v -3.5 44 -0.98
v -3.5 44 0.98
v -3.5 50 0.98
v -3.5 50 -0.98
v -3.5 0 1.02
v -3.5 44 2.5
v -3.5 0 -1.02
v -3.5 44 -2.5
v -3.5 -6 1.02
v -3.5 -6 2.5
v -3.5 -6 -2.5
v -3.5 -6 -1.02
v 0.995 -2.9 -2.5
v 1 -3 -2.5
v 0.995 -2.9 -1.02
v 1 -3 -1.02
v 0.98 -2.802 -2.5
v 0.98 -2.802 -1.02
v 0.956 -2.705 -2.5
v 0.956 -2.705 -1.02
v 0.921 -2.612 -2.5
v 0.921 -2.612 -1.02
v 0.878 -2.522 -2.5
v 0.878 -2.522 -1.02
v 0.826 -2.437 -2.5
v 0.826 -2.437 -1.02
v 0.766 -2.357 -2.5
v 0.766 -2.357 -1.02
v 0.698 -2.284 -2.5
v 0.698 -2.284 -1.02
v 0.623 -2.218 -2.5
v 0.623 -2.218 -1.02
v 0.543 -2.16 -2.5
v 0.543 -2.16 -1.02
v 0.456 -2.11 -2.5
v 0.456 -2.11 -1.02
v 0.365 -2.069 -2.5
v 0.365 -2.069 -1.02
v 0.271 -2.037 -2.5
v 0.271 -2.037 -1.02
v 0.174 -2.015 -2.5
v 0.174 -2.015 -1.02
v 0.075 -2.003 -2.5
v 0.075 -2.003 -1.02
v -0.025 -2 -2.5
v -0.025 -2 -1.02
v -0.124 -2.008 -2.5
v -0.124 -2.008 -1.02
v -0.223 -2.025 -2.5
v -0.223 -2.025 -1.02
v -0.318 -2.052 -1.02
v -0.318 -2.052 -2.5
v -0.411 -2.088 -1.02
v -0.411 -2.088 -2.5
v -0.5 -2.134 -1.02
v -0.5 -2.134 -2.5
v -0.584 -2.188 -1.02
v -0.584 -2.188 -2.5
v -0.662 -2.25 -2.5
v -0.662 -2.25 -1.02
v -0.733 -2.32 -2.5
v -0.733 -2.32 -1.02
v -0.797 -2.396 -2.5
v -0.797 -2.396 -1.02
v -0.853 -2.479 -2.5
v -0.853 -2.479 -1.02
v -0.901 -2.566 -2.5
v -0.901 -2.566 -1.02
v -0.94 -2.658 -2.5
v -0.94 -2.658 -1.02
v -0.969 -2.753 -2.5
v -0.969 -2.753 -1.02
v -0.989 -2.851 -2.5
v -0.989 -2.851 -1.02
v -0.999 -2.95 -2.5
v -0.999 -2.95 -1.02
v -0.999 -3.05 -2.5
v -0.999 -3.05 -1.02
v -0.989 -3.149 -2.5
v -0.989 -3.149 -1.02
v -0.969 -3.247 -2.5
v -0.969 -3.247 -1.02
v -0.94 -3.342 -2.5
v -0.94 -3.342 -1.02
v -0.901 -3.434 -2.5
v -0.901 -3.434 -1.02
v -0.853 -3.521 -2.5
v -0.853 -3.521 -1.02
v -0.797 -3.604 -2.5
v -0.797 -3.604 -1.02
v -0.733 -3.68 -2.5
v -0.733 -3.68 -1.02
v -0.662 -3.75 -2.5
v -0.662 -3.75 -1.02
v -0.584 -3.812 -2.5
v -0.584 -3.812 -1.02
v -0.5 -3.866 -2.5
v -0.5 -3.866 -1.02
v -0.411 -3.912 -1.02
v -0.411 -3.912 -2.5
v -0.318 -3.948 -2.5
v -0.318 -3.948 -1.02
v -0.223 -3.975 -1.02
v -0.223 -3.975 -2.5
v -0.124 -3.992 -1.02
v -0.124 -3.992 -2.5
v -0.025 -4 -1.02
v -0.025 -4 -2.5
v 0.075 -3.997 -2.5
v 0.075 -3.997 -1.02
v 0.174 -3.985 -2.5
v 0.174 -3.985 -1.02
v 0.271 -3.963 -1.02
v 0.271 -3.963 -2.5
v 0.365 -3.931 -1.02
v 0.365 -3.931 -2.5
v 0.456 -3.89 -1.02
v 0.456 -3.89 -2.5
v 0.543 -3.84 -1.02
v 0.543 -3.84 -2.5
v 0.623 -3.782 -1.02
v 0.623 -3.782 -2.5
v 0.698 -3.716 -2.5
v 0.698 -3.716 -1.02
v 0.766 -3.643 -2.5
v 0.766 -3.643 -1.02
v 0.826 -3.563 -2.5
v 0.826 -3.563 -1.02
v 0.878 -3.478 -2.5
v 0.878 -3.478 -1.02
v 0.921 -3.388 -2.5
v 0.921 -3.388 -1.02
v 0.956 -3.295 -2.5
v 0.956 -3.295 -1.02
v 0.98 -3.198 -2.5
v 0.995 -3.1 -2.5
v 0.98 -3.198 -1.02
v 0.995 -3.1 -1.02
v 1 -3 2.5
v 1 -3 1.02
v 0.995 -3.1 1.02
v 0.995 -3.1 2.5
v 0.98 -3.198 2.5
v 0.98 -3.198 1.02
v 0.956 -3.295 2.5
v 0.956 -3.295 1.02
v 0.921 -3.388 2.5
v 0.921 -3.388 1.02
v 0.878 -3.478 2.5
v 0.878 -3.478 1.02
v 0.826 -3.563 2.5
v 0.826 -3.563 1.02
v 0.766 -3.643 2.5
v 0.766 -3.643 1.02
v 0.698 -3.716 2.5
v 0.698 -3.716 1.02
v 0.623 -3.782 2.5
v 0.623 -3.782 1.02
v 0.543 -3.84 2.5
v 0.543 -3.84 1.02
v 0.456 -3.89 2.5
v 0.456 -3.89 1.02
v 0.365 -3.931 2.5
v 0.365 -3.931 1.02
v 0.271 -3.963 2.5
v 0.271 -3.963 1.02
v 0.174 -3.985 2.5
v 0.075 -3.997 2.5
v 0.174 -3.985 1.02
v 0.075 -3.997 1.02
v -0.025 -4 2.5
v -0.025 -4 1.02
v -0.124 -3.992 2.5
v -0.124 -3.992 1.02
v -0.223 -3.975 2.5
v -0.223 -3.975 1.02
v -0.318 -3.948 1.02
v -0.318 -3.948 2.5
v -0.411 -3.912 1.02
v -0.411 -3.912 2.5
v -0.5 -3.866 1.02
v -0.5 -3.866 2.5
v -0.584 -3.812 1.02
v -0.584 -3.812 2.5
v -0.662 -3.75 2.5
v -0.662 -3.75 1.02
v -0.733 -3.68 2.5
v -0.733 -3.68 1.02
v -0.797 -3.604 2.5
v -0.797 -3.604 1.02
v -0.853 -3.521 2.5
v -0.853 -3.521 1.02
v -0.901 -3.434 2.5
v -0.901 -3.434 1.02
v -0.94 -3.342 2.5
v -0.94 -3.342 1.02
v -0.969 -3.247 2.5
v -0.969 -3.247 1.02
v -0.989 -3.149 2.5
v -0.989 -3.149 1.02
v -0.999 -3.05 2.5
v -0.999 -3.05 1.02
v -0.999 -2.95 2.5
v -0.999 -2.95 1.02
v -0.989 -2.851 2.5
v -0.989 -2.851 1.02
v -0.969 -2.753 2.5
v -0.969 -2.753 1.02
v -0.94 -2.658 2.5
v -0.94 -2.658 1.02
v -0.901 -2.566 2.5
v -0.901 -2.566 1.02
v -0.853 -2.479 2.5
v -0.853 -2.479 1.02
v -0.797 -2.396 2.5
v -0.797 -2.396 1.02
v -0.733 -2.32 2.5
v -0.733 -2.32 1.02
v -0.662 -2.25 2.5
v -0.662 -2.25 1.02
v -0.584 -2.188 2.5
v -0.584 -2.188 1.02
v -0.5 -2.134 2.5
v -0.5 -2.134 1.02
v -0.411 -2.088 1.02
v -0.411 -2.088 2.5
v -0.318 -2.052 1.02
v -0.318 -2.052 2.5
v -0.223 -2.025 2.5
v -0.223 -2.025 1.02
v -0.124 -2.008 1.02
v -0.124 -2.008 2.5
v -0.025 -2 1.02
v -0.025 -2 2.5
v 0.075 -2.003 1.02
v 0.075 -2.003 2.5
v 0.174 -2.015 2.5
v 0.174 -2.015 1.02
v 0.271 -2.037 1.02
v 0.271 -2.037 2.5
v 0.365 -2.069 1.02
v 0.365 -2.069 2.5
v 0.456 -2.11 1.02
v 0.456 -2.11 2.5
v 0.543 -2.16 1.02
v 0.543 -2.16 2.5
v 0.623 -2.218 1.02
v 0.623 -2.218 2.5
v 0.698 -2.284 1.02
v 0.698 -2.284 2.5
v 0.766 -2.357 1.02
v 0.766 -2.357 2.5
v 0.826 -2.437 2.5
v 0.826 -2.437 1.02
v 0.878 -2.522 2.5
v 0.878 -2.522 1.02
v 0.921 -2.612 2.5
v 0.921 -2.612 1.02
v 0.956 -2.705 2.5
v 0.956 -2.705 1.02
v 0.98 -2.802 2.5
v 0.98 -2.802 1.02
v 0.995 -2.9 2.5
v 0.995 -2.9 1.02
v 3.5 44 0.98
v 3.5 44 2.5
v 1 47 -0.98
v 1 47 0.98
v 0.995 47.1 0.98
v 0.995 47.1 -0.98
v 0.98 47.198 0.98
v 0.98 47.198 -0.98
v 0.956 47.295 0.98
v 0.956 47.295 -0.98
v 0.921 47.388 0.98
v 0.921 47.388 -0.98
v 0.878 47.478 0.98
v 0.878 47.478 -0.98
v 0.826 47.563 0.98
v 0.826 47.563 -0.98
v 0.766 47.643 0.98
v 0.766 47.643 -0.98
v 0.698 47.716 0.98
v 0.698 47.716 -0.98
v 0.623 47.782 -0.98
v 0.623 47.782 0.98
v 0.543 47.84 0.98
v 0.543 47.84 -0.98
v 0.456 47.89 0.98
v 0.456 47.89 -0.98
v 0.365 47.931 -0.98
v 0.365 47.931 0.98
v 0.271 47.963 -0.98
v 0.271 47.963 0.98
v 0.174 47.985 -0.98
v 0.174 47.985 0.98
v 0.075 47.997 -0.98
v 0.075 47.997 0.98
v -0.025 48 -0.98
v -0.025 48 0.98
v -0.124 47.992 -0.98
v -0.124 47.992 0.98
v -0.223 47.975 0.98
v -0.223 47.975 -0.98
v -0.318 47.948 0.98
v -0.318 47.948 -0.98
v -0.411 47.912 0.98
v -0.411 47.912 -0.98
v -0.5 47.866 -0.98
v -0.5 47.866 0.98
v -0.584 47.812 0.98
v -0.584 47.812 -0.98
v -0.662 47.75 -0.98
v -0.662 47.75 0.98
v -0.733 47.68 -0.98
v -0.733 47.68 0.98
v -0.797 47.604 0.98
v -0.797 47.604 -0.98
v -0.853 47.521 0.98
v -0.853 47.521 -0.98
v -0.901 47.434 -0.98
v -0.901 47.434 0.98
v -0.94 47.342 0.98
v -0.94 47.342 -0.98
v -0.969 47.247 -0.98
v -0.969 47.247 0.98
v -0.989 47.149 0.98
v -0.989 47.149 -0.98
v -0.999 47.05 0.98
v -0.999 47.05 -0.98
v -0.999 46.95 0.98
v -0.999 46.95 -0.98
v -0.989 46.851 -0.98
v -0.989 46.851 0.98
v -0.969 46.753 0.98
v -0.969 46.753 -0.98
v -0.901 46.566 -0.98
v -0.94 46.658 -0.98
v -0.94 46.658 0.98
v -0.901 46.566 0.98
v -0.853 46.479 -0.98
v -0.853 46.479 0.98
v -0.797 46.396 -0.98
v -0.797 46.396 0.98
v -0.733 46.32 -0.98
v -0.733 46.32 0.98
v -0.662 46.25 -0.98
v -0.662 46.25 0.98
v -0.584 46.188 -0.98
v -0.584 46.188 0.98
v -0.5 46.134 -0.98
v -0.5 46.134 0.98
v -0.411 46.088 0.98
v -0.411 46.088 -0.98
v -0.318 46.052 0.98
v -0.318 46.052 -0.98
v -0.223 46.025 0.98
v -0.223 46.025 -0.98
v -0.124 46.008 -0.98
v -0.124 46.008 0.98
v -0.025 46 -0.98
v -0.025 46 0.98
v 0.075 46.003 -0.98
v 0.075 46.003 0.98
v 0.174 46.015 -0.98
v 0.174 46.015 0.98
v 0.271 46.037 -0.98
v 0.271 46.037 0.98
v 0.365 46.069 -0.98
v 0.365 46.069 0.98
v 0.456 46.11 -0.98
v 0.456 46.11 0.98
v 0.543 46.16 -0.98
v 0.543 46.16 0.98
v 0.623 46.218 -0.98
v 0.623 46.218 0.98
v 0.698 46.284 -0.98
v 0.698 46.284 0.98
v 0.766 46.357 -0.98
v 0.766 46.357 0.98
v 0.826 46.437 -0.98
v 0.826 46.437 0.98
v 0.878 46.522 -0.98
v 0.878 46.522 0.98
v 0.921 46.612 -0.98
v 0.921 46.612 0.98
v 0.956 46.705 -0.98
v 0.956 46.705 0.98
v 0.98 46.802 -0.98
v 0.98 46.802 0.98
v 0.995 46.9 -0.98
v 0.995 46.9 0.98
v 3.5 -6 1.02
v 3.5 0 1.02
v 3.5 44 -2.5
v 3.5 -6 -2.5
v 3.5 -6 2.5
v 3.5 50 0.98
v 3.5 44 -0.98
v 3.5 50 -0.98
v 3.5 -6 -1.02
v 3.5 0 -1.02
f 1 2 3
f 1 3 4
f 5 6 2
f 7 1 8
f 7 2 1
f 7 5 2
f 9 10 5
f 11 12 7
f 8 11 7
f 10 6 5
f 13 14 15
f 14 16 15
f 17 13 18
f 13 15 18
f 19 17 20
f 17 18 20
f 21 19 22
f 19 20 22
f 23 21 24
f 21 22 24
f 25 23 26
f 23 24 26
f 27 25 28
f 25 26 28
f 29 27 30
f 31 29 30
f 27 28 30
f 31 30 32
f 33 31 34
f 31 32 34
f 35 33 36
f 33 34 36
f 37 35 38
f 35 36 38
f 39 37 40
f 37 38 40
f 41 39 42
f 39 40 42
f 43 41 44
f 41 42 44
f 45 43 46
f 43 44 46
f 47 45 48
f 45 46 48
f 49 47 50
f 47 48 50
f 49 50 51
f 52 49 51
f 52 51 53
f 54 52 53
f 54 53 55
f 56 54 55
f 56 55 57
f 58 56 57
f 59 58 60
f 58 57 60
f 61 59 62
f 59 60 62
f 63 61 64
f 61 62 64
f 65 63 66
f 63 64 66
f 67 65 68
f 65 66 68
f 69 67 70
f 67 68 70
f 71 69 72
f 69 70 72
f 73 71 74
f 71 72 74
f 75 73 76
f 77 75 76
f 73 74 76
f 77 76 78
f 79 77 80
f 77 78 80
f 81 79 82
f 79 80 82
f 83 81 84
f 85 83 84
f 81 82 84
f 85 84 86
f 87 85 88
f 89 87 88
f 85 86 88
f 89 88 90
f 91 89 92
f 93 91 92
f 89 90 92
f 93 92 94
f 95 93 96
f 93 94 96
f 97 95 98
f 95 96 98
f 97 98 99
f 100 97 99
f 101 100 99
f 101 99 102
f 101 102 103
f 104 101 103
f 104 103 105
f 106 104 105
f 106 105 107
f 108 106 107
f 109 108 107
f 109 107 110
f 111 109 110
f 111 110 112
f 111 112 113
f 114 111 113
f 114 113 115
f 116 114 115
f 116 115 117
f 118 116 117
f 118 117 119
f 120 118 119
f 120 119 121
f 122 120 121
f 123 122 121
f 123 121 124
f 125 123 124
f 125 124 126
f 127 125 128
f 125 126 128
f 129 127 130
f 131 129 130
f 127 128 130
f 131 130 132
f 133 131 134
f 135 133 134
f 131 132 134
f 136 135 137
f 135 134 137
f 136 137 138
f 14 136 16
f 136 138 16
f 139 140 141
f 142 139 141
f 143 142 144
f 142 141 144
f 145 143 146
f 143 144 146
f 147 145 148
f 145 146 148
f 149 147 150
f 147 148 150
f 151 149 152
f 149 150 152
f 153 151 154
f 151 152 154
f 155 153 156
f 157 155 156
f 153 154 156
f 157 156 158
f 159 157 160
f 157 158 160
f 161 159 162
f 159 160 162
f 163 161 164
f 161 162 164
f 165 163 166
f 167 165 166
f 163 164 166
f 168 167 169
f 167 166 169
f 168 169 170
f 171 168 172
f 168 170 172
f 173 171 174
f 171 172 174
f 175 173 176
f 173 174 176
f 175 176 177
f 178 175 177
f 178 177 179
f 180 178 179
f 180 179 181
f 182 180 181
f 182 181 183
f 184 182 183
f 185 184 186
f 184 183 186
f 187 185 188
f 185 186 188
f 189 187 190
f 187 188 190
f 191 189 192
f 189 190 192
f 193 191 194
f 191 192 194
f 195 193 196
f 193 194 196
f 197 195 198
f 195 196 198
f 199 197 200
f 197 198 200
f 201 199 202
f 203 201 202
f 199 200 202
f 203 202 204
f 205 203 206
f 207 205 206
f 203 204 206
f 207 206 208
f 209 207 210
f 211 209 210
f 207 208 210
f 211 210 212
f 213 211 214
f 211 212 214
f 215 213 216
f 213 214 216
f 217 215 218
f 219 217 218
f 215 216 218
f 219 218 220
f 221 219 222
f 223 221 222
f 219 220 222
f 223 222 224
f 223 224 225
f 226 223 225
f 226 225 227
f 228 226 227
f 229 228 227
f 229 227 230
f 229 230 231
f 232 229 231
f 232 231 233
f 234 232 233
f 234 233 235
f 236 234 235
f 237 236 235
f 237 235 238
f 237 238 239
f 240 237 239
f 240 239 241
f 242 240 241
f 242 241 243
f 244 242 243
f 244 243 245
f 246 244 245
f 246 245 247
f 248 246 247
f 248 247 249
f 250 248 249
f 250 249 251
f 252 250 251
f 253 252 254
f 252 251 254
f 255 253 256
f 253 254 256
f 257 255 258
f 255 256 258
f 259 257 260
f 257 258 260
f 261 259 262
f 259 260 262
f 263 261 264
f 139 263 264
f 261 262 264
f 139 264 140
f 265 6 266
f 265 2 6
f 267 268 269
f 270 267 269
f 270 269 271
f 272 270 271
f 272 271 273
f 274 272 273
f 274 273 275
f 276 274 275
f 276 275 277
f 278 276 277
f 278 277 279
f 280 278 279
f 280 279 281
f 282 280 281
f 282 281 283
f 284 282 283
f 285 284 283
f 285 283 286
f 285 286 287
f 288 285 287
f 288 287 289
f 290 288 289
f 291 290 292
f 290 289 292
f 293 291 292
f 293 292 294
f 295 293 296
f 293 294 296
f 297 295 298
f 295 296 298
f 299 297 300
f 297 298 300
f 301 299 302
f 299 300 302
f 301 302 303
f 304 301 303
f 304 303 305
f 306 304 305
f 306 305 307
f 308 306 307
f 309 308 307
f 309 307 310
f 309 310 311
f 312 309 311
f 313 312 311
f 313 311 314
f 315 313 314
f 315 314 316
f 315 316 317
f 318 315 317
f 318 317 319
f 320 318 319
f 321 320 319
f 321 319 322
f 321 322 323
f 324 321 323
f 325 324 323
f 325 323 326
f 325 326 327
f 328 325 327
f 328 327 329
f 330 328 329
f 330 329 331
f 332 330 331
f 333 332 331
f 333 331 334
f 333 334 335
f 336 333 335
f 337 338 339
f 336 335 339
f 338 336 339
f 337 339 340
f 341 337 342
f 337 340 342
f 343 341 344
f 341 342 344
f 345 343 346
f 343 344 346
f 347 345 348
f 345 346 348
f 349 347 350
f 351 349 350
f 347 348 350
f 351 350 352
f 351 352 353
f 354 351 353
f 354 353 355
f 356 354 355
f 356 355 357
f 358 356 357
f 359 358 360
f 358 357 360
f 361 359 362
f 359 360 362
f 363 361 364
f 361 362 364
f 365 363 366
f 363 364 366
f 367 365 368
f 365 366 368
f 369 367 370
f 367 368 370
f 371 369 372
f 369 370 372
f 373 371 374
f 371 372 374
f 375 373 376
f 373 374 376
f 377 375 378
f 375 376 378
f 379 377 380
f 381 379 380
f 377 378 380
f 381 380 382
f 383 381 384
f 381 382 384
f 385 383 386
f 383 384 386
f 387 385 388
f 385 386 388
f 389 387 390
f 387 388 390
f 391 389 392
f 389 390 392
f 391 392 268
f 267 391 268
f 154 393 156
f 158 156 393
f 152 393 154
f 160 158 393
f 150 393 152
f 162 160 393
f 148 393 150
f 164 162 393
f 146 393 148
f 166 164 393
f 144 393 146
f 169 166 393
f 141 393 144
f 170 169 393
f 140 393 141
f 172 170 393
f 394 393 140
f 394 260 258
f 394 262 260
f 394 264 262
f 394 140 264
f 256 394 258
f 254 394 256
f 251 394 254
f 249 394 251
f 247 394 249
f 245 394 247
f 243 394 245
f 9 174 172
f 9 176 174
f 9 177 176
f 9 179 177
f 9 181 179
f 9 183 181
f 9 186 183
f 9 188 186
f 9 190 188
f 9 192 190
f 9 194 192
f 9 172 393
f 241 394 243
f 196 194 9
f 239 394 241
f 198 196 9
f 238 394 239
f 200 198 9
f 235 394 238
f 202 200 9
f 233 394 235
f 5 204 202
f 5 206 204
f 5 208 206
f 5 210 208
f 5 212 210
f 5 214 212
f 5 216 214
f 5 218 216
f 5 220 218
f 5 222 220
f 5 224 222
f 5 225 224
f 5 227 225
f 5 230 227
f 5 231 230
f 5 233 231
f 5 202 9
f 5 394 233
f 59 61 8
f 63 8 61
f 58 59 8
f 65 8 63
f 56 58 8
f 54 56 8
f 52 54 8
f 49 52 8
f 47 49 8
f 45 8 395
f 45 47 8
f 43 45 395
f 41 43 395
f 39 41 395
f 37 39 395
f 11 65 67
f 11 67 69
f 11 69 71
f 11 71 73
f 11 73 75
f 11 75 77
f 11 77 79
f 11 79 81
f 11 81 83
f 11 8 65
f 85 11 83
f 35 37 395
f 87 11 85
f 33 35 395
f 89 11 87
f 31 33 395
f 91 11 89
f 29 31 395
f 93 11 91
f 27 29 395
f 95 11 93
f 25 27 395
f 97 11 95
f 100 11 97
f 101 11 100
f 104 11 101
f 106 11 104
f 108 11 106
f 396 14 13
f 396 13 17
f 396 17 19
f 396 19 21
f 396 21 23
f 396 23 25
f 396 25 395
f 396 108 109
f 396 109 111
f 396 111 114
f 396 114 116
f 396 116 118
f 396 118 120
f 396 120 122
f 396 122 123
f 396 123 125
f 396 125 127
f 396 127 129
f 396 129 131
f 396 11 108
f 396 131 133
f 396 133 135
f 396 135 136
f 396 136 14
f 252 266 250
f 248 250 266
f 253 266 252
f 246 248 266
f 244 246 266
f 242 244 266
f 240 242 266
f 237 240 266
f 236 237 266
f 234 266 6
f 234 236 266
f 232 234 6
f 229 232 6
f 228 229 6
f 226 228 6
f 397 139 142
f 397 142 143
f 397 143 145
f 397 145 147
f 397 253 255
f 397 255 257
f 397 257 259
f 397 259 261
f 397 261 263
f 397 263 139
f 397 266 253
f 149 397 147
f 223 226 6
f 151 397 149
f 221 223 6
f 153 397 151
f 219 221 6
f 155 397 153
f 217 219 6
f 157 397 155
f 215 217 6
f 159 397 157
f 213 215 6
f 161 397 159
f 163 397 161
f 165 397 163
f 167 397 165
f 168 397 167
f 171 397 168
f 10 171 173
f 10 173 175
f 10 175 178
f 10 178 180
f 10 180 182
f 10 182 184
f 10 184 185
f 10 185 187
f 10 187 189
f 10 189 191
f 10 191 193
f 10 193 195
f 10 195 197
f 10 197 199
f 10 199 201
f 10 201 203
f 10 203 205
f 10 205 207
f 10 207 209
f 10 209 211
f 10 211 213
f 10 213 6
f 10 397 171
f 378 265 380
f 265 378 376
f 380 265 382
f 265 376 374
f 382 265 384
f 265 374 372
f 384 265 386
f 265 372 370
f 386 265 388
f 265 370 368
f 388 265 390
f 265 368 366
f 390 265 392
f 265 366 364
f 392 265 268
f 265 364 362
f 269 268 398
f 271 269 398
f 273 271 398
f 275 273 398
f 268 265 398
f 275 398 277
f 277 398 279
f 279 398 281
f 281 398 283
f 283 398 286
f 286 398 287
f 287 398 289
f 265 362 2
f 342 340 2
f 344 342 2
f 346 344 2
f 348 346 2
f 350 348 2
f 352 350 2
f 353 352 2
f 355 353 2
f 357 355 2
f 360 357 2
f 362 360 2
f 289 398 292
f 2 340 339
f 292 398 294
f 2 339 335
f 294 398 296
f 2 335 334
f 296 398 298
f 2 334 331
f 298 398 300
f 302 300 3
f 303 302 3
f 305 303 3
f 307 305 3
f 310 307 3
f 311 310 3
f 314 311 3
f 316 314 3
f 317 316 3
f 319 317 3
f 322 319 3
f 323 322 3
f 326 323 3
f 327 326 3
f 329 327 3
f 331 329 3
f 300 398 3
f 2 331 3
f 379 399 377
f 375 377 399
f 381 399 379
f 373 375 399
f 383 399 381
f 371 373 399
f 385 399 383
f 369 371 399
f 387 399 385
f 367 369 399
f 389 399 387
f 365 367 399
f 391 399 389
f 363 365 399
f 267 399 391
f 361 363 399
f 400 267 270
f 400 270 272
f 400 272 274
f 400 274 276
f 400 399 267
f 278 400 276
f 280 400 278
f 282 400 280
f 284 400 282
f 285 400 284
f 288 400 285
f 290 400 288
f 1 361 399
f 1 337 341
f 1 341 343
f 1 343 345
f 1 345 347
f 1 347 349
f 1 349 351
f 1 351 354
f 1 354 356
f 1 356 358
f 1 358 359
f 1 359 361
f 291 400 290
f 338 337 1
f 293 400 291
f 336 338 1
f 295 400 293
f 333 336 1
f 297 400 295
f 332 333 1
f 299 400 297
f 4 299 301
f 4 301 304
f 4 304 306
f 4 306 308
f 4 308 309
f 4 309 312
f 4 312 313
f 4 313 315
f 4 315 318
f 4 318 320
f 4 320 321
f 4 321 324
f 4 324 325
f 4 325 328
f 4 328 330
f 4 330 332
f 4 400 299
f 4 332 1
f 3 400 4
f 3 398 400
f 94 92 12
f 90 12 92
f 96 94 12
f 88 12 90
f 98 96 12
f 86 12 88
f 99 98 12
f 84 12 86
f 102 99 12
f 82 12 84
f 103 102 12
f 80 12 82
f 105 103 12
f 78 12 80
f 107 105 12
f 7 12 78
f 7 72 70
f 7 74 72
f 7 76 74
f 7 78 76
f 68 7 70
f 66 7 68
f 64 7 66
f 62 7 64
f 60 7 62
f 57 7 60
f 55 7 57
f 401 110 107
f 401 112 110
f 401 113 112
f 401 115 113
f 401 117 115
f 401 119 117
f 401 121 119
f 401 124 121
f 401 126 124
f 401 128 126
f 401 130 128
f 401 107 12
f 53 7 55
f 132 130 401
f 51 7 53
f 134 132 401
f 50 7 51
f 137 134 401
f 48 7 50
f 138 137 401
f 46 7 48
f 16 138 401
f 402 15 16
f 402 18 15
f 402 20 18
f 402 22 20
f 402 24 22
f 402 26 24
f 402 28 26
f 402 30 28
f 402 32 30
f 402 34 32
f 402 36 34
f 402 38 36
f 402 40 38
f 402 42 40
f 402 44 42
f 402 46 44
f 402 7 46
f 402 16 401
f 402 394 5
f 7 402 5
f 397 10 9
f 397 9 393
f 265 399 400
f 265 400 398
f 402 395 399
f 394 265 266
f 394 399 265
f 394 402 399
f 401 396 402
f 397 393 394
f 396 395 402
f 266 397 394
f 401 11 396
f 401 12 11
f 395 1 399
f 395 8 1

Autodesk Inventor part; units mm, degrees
ref_plane "YZ Plane" through (0, 0, 0) normal (1, 0, 0) x (0, 1, 0)
ref_plane "XZ Plane" through (0, 0, 0) normal (0, 1, 0) x (-1, 0, 0)
ref_plane "XY Plane" through (0, 0, 0) normal (0, 0, 1) x (1, 0, 0)
sketch "Sketch1" plane through (0, 0, 0) normal (0, 1, 0) x (-1, 0, 0)
  line L0 (-3.5, 2.5) -> (3.5, 2.5)
  line L1 (3.5, 2.5) -> (3.5, -2.5)
  line L2 (3.5, -2.5) -> (-3.5, -2.5)
  line L3 (-3.5, -2.5) -> (-3.5, 2.5)
  line L4 (-3.5, 2.5) -> (3.5, -2.5) construction
  line L5 (3.5, 2.5) -> (-3.5, -2.5) construction
  point P0 (0, 0)
  dimension "d0" = 5
  dimension "d1" = 7
extrude "Extrusion1" add sketch "Sketch1" along normal blind 50
sketch "Sketch2" plane through (0, 50, 0) normal (0, 1, 0) x (1, 0, 0)
  line L0 (-3.5, -2.5) -> (3.5, -2.5) projected
  line L1 (3.5, -2.5) -> (3.5, 2.5) projected
  line L2 (3.5, 2.5) -> (-3.5, 2.5) projected
  line L3 (-3.5, -2.5) -> (3.5, -2.5)
  line L4 (3.5, -2.5) -> (3.5, -0.98)
  line L5 (3.5, -0.98) -> (-3.5, -0.98)
  line L6 (-3.5, -0.98) -> (-3.5, -2.5)
  line L7 (-3.5, 2.5) -> (3.5, 2.5)
  line L8 (3.5, 2.5) -> (3.5, 0.98)
  line L9 (3.5, 0.98) -> (-3.5, 0.98)
  line L10 (-3.5, 0.98) -> (-3.5, 2.5)
  point P0 (0, 0)
  dimension "d4" = 1.52
  dimension "d5" = 1.52
extrude "Extrusion2" cut sketch "Sketch2" against normal blind 6
sketch "Sketch3" plane through (-3.5, 50, 0.98) normal (0, 0, 1) x (1, 0, 0)
  line L0 (0, 0) -> (7, 0) projected
  line L1 (7, 0) -> (7, -6) projected
  circle A0 centre (3.5, -3) radius 1
  point P0 (3.5, -50)
  dimension "d8" = 2
  dimension "d9" = 3.5
  dimension "d10" = 3
extrude "Extrusion3" cut sketch "Sketch3" against normal through all
sketch "Sketch4" plane through (0, 0, 0) normal (0, -1, 0) x (1, 0, 0)
  line L0 (3.5, 2.5) -> (-3.5, 2.5) projected
  line L1 (-3.5, 2.5) -> (-3.5, -2.5) projected
  line L2 (-3.5, -2.5) -> (3.5, -2.5) projected
  line L3 (3.5, 0.98) -> (3.5, -0.98) projected
  line L4 (-3.5, 2.5) -> (3.5, 2.5)
  line L5 (3.5, 2.5) -> (3.5, 1.02)
  line L6 (3.5, 1.02) -> (-3.5, 1.02)
  line L7 (-3.5, 1.02) -> (-3.5, 2.5)
  line L8 (-3.5, -2.5) -> (3.5, -2.5) projected
  line L9 (3.5, -2.5) -> (-3.5, -2.5)
  line L10 (-3.5, -2.5) -> (-3.5, -1.02)
  line L11 (-3.5, -1.02) -> (3.5, -1.02)
  line L12 (3.5, -1.02) -> (3.5, -2.5)
  point P0 (0, 0)
  dimension "d13" = 1.48
  dimension "d14" = 1.48
extrude "Extrusion4" add sketch "Sketch4" along normal blind 6
sketch "Sketch5" plane through (-3.5, 0, 1.02) normal (0, 0, -1) x (1, 0, 0)
  line L0 (7, 0) -> (0, 0) projected
  line L1 (7, 0) -> (7, 6) projected
  circle A0 centre (3.5, 3) radius 1
  point P0 (3.5, 0)
  dimension "d17" = 3
  dimension "d18" = 3.5
  dimension "d19" = 2
extrude "Extrusion6" cut sketch "Sketch5" along normal through all both and the other way through all
properties part number "LD_holder_p4"
